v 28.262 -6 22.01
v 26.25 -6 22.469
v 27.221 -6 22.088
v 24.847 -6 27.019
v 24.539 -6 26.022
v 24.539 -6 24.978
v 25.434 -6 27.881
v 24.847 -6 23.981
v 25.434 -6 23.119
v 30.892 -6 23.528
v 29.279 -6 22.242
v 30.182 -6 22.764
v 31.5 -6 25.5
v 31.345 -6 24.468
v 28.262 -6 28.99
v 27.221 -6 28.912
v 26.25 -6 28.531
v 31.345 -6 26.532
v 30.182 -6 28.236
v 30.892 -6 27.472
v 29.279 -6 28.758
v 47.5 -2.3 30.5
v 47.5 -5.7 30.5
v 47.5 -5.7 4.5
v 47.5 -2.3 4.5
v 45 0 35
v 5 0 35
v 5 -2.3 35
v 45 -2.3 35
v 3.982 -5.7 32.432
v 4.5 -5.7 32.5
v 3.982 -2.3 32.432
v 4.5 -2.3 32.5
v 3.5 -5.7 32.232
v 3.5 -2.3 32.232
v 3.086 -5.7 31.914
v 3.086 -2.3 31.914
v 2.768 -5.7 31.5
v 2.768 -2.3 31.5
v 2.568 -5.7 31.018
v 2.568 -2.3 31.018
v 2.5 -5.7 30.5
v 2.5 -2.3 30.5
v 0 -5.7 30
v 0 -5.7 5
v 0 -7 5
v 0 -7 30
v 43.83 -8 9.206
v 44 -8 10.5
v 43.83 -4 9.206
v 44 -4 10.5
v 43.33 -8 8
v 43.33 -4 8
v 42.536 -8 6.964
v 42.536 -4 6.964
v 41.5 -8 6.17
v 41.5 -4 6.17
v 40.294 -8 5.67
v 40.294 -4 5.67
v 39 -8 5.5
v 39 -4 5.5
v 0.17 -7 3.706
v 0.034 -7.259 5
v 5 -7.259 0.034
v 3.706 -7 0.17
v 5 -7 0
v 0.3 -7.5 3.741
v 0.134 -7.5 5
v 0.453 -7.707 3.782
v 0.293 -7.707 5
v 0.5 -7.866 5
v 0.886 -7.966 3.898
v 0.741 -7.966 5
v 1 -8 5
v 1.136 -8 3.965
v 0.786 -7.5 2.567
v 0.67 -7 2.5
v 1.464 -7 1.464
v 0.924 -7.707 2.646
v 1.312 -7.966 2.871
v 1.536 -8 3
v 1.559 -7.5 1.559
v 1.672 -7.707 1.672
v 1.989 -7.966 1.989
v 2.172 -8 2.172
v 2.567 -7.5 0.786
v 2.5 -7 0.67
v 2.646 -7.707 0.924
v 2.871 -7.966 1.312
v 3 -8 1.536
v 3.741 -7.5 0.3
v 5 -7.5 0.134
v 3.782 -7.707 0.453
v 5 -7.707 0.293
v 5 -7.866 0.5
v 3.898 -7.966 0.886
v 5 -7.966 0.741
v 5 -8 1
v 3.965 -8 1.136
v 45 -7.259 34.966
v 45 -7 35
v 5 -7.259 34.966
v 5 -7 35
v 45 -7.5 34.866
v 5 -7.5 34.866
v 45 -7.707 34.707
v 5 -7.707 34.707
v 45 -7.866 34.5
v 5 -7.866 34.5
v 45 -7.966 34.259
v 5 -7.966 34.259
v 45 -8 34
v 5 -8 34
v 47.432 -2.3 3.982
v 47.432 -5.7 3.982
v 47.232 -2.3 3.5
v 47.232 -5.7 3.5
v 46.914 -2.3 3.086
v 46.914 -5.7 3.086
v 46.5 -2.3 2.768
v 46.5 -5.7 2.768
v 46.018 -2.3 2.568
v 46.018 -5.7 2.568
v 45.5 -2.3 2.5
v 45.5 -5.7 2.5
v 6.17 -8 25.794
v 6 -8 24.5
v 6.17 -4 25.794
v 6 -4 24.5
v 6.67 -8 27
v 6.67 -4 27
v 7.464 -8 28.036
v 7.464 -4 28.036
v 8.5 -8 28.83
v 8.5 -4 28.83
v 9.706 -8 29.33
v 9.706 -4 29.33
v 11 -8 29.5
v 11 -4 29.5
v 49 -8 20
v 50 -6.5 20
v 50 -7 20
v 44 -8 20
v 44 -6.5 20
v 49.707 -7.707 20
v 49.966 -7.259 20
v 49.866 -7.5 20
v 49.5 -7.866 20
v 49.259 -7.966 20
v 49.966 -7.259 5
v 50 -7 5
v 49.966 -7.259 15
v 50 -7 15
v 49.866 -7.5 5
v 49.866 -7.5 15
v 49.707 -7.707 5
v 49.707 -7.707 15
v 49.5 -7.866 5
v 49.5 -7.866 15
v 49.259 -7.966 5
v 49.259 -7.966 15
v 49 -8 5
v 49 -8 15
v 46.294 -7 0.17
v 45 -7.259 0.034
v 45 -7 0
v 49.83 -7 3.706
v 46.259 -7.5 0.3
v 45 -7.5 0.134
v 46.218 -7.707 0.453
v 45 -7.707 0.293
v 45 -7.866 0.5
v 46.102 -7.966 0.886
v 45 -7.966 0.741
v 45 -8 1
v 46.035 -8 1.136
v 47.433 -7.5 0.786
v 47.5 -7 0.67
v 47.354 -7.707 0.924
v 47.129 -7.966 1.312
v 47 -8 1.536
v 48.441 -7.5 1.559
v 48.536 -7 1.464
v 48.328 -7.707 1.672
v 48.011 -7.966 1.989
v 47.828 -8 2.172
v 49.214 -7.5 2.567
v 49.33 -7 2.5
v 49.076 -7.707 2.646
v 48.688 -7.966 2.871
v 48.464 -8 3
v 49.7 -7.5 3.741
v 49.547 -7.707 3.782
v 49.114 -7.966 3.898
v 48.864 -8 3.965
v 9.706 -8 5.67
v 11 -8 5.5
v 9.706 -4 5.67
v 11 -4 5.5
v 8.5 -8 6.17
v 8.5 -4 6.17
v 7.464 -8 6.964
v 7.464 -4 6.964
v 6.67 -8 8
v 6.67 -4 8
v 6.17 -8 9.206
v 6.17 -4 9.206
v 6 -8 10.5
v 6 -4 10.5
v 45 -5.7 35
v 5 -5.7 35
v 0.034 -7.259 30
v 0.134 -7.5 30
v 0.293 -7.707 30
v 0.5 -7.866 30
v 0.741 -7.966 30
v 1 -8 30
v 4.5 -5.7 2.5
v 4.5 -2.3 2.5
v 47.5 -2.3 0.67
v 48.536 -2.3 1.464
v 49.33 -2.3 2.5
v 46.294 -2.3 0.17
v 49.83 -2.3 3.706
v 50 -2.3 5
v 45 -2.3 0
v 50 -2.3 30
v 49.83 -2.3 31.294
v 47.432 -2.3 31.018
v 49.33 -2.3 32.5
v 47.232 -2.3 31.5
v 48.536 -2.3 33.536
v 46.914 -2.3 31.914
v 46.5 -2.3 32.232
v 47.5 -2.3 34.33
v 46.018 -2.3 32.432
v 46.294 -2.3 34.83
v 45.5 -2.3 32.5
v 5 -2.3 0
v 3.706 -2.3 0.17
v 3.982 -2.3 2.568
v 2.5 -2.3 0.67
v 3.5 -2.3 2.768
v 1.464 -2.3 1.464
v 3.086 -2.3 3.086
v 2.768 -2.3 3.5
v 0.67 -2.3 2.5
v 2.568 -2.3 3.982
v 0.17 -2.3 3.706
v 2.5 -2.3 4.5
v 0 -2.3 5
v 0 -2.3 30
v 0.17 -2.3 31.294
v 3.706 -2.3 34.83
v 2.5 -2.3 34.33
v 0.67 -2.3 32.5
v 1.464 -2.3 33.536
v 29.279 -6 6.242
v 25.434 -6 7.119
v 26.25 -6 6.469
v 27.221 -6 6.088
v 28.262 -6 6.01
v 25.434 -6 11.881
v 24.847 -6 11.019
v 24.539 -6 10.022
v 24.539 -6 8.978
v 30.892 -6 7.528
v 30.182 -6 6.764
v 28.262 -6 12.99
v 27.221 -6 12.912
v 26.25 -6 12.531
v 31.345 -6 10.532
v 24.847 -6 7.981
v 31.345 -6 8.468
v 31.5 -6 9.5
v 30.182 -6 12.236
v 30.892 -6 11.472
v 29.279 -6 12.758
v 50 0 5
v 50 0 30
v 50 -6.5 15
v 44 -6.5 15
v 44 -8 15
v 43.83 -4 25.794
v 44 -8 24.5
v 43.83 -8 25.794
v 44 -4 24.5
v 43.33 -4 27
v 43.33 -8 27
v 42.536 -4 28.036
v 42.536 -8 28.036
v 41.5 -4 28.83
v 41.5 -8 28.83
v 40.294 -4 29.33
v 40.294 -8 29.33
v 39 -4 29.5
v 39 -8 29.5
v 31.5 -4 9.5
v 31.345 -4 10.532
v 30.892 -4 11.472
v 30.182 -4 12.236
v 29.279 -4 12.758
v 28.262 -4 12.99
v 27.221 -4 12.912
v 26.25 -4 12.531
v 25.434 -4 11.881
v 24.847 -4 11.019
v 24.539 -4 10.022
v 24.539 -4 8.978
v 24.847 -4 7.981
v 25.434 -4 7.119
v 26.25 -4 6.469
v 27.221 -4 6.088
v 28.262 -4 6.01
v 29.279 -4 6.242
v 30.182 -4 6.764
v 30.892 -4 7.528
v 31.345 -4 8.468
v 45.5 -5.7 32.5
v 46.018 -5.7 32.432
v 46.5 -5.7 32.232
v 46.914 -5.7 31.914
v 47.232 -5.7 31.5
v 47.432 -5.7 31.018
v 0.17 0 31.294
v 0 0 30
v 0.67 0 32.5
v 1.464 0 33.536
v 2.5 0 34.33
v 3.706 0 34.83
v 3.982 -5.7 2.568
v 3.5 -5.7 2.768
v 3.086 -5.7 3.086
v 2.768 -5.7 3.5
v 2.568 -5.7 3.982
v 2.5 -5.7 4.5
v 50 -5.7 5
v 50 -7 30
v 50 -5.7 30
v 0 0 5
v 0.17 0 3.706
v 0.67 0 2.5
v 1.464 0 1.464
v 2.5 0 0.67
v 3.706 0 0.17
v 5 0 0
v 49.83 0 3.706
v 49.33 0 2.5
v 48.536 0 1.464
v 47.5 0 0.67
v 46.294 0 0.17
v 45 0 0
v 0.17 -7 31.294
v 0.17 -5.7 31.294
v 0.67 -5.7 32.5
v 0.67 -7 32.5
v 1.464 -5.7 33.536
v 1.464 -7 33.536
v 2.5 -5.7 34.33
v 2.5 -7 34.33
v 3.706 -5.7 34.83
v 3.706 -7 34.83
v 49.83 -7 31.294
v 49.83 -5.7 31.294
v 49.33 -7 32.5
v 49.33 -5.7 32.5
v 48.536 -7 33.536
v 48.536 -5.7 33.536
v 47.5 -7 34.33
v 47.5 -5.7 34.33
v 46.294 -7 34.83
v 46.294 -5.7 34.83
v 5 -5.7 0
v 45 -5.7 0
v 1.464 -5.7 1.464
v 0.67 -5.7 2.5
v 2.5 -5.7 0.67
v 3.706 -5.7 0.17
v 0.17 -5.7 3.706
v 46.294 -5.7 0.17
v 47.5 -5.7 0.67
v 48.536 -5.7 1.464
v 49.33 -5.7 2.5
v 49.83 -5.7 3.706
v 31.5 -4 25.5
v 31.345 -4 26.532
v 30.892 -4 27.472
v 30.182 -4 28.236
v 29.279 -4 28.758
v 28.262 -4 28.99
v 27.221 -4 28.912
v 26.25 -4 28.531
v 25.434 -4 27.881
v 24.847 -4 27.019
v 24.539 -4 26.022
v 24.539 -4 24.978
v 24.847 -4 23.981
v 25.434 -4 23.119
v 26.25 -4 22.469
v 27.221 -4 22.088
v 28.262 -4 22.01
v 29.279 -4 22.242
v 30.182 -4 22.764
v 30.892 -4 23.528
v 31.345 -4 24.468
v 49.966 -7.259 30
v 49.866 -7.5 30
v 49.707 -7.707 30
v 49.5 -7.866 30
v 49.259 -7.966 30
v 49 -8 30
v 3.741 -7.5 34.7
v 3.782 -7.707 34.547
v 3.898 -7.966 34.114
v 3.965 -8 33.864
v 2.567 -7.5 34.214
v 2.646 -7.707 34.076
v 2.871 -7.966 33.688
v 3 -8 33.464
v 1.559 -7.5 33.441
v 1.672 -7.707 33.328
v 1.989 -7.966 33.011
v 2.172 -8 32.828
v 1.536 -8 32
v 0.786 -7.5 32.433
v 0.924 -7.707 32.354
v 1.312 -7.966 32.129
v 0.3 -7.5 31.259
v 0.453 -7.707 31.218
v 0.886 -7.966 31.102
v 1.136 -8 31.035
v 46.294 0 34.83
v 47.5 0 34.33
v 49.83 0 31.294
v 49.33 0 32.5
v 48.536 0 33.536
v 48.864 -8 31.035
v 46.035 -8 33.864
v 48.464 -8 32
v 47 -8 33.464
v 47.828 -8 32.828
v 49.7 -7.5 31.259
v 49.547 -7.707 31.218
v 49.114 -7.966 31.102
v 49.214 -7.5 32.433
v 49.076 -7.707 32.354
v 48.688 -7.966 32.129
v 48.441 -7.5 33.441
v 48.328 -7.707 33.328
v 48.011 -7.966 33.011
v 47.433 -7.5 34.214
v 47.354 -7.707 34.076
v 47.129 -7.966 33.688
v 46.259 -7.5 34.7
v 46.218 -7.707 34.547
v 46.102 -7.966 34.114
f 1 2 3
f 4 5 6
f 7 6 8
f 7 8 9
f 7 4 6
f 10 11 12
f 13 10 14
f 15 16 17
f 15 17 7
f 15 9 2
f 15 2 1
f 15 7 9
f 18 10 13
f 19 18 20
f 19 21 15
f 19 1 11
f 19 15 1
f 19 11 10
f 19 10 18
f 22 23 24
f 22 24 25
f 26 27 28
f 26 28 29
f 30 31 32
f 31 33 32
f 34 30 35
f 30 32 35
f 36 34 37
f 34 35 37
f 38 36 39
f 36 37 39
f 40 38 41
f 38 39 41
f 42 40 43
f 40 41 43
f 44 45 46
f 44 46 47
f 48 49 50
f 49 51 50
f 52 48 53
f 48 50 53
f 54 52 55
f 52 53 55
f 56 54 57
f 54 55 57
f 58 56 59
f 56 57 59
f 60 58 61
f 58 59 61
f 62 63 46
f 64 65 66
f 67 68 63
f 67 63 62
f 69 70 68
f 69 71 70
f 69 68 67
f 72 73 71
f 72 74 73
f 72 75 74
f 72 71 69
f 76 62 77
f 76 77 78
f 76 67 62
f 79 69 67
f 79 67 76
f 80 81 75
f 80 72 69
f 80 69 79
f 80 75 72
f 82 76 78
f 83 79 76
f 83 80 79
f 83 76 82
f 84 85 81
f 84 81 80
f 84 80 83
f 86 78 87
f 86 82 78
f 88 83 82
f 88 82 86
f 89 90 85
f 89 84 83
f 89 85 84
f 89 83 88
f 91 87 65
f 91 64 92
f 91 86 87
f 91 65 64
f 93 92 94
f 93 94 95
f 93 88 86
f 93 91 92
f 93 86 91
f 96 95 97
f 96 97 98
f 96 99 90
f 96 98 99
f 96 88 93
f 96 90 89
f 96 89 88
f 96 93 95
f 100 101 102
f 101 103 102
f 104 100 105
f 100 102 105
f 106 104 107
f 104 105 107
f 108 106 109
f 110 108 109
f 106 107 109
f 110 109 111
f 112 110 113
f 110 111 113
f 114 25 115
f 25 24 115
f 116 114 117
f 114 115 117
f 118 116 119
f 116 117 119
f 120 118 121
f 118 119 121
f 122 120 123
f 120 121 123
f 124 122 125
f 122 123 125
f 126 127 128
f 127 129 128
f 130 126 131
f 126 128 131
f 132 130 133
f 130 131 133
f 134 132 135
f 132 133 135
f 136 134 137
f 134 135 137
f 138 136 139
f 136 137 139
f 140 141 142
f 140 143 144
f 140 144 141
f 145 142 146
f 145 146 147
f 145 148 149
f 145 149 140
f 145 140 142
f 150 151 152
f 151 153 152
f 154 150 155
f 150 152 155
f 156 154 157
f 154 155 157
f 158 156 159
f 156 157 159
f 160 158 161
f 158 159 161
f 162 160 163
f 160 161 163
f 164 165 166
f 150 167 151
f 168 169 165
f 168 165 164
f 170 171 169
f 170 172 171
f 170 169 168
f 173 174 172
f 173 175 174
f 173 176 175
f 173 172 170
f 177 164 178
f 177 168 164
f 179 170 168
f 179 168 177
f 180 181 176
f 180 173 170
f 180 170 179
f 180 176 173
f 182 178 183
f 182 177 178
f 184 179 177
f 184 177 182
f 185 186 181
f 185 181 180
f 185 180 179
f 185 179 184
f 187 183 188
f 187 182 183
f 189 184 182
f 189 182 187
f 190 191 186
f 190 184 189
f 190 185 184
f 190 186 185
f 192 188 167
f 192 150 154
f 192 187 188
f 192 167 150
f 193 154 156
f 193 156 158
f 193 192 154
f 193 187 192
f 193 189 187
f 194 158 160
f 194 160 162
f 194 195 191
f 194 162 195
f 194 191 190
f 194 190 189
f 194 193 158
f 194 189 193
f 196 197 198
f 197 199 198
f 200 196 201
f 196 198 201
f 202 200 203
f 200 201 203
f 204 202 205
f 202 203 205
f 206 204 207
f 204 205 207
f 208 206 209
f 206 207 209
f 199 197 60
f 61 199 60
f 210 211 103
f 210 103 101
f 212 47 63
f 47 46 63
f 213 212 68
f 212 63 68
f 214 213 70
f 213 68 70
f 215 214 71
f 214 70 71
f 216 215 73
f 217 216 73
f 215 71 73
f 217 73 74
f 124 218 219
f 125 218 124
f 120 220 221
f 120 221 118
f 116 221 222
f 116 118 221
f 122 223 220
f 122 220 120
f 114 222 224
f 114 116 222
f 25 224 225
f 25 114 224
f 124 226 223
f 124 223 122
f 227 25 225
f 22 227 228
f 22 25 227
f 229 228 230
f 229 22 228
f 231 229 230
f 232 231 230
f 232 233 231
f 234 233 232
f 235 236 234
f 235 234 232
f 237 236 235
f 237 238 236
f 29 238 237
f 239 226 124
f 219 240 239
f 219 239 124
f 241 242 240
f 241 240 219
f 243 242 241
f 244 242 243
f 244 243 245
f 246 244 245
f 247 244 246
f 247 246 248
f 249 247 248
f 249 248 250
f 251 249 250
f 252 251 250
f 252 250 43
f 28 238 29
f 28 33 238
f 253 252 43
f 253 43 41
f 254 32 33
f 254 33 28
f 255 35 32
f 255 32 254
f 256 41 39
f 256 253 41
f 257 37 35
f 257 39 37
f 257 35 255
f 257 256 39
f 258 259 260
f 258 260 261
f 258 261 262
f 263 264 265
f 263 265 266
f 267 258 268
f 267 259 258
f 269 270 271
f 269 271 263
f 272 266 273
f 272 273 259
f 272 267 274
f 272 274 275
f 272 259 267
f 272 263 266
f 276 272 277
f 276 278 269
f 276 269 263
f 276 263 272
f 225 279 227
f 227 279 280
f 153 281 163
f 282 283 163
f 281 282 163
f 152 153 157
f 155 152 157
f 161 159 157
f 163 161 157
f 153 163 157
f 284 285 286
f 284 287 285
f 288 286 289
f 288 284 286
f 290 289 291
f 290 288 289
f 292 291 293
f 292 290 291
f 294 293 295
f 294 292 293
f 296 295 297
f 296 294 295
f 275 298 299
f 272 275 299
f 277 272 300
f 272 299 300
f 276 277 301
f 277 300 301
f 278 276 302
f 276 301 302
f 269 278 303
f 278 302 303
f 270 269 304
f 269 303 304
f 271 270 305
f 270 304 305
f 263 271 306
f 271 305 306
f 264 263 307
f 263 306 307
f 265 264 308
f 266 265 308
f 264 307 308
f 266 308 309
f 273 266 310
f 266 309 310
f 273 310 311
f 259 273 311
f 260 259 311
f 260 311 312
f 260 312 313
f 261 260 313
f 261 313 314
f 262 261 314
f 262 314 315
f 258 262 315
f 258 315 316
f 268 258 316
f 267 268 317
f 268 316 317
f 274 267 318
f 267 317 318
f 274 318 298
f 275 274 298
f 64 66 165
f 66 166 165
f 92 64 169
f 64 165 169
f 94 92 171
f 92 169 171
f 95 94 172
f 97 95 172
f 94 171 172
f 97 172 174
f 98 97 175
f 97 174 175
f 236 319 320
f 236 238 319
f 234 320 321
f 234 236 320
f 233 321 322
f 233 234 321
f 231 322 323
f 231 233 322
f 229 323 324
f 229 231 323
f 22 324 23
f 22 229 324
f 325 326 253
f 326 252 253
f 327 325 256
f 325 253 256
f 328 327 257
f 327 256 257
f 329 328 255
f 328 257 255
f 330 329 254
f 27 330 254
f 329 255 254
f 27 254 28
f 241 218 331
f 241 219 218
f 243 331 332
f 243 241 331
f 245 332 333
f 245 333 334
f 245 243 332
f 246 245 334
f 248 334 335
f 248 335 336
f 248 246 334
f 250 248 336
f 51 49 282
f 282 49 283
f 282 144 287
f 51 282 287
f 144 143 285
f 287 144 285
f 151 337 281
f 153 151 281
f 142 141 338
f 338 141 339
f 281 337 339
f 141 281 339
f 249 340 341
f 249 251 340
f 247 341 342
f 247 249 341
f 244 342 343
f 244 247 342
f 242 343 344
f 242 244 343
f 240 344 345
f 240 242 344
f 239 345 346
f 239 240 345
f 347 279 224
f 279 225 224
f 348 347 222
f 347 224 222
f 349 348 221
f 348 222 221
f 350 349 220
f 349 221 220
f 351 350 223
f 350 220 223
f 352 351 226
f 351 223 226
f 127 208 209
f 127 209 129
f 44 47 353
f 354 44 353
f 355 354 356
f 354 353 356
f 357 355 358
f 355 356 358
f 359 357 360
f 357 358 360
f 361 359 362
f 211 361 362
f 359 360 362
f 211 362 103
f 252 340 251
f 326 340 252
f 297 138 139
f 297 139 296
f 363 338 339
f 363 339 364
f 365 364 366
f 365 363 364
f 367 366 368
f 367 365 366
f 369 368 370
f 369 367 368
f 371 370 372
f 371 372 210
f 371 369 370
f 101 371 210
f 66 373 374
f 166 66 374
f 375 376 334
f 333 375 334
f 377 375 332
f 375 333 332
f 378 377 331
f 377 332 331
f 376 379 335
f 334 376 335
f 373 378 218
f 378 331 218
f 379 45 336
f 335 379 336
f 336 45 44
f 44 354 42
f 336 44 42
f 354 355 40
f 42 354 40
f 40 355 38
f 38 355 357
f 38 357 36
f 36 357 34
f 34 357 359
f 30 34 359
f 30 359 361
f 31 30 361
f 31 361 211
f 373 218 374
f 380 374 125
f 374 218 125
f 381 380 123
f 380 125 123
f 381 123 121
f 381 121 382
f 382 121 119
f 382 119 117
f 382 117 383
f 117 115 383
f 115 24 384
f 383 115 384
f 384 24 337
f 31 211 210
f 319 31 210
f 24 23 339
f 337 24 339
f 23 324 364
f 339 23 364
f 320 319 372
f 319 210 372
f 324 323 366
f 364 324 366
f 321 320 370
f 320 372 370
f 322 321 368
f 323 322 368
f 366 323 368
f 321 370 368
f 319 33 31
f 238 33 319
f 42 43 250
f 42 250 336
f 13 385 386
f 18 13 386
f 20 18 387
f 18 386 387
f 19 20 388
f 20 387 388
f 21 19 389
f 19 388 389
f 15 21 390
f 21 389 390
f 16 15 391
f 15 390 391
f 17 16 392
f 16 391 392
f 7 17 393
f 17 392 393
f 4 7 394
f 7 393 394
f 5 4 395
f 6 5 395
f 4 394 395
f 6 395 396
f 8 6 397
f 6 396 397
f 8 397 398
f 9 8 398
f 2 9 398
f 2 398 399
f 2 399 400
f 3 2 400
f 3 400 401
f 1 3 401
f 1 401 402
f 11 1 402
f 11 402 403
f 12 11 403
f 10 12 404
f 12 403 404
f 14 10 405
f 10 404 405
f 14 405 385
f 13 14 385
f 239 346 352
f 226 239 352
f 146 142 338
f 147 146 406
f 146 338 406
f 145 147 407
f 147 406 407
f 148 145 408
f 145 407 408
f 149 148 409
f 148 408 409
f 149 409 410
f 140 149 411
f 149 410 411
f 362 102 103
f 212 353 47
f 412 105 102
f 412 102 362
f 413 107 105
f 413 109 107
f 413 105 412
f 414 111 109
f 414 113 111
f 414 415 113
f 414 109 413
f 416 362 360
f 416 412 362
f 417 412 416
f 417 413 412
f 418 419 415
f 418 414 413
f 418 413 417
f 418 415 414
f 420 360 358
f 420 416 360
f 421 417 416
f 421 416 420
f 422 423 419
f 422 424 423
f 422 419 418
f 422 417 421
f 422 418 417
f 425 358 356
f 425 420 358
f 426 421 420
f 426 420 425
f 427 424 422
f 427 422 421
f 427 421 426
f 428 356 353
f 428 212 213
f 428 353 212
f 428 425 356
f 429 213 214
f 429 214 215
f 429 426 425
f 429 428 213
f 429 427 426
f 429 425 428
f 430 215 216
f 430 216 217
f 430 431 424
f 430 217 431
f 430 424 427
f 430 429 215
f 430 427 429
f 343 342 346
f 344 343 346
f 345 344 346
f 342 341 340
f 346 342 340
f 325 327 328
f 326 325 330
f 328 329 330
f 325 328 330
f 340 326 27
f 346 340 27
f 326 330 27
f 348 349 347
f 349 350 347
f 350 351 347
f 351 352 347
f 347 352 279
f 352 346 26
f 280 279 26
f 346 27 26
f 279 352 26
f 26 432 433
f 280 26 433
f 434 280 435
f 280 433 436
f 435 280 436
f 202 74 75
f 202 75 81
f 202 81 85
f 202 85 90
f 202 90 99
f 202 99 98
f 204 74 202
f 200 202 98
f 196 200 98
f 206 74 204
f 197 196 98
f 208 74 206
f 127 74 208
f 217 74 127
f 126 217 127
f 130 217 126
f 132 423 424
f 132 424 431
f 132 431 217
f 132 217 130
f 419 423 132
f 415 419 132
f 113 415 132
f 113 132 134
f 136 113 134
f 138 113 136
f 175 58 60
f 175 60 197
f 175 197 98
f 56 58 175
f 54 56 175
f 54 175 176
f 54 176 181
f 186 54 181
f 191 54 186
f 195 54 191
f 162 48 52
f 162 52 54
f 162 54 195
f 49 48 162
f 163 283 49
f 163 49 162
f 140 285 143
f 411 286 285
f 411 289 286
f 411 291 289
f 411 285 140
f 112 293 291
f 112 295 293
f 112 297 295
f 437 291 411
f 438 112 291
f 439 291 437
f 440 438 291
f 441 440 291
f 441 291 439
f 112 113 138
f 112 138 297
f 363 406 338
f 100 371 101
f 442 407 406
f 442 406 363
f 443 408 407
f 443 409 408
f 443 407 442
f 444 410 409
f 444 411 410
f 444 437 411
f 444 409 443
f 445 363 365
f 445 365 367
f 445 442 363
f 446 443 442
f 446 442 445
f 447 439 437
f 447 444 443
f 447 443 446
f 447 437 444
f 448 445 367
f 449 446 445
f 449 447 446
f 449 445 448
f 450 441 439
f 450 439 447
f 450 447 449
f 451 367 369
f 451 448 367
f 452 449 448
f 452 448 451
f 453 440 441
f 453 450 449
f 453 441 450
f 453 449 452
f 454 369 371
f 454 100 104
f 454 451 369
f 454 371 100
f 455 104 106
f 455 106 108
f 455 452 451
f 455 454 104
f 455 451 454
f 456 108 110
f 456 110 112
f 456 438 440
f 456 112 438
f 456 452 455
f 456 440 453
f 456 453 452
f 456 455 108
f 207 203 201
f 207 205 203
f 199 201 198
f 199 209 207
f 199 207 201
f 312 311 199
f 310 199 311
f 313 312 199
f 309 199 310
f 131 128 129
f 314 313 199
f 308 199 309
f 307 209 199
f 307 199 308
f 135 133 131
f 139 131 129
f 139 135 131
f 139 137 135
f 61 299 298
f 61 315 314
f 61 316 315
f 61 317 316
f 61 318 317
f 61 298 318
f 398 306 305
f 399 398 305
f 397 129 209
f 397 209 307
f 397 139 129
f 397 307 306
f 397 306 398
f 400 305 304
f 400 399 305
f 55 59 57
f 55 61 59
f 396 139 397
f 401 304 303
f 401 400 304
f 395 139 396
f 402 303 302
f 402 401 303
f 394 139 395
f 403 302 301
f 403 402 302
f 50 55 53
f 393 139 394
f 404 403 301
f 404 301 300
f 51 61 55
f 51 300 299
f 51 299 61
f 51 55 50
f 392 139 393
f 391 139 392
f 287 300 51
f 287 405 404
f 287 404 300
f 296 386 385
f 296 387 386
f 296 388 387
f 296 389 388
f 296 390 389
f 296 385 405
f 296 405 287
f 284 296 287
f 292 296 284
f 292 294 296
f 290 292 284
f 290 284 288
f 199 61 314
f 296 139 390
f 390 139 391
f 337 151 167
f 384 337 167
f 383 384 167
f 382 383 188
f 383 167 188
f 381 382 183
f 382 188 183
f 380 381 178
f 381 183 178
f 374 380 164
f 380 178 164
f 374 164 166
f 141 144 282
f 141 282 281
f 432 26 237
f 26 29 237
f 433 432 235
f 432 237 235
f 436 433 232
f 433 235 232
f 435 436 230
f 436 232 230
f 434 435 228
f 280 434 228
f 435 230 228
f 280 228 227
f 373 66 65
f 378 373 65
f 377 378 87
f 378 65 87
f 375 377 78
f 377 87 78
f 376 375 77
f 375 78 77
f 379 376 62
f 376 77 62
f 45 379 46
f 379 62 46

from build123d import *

# Parameters (mm, degrees)
F0_W      = 50
F0_H      = 35
F1_DEPTH  = 8
F2_W      = 38
F2_H      = 24
F3_DEPTH  = 4
F4_R      = 3.5
F6_DEPTH  = 2
F5_R      = 3.5
F7_DEPTH  = 2
F8_W      = 6
F8_H      = 5
F9_DEPTH  = 1.5
F10_W     = 50
F10_H     = 3.4
F14_DEPTH = 2.5
F11_W     = 3.4
F11_H     = 35
F15_DEPTH = 2.5
F12_W     = 50
F12_H     = 3.4
F16_DEPTH = 2.5
F13_W     = 3.4
F13_H     = 35
F17_DEPTH = 2.5
F18_R     = 5
F19_R     = 1
F20_R     = 2


with BuildPart() as f1:
    # F0 (on Front) → F1 (new body)
    with BuildSketch(Plane.XZ):
        with Locations((25, 17.5)):
            Rectangle(F0_W, F0_H)
    extrude(amount=F1_DEPTH)

    # F2 (on face) → F3 (cut)
    with BuildSketch(Plane.XZ.offset(8)):
        with Locations((25, 17.5)):
            Rectangle(F2_W, F2_H)
    extrude(amount=-F3_DEPTH, mode=Mode.SUBTRACT)

    # F4 (on face) → F6 (join)
    with BuildSketch(Plane.XZ.offset(4)):
        with Locations((28, 9.5)):
            Circle(F4_R)
    extrude(amount=F6_DEPTH)

    # F5 (on face) → F7 (join)
    with BuildSketch(Plane.XZ.offset(4)):
        with Locations((28, 25.5)):
            Circle(F5_R)
    extrude(amount=F7_DEPTH)

    # F8 (on face) → F9 (cut)
    with BuildSketch(Plane.XZ.offset(8)):
        with Locations((47, 17.5)):
            Rectangle(F8_W, F8_H)
    extrude(amount=-F9_DEPTH, mode=Mode.SUBTRACT)

    # F10 (on face) → F14 (cut)
    with BuildSketch(Plane(origin=(0, 0, 0), x_dir=(1, 0, 0), z_dir=(0, 0, -1))):
        with Locations((25, 4)):
            Rectangle(F10_W, F10_H)
    extrude(amount=-F14_DEPTH, mode=Mode.SUBTRACT)

    # F11 (on face) → F15 (cut)
    with BuildSketch(Plane(origin=(0, 0, 0), x_dir=(0, -1, 0), z_dir=(-1, 0, 0))):
        with Locations((4, 17.5)):
            Rectangle(F11_W, F11_H)
    extrude(amount=-F15_DEPTH, mode=Mode.SUBTRACT)

    # F12 (on face) → F16 (cut)
    with BuildSketch(Plane.XY.offset(35)):
        with Locations((25, -4)):
            Rectangle(F12_W, F12_H)
    extrude(amount=-F16_DEPTH, mode=Mode.SUBTRACT)

    # F13 (on face) → F17 (cut)
    with BuildSketch(Plane.YZ.offset(50)):
        with Locations((-4, 17.5)):
            Rectangle(F13_W, F13_H)
    extrude(amount=-F17_DEPTH, mode=Mode.SUBTRACT)

    # F18
    f18_edges = [f1.edges().sort_by_distance(p)[0] for p in [
        (0, -1.15, 35),
        (0, -6.85, 35),
        (0, -1.15, 0),
        (0, -6.85, 0),
        (50, -1.15, 0),
        (50, -6.85, 0),
        (50, -1.15, 35),
        (50, -6.85, 35),
        (44, -6, 29.5),
        (44, -6, 5.5),
        (6, -6, 5.5),
        (6, -6, 29.5),
    ]]
    fillet(f18_edges, radius=F18_R)

    # F19
    f19_edges = [f1.edges().sort_by_distance(p)[0] for p in [
        (25, -8, 0),
    ]]
    fillet(f19_edges, radius=F19_R)

    # F20
    f20_edges = [f1.edges().sort_by_distance(p)[0] for p in [
        (2.5, -4, 32.5),
        (2.5, -4, 2.5),
        (47.5, -4, 2.5),
        (47.5, -4, 32.5),
    ]]
    fillet(f20_edges, radius=F20_R)


solid = f1.part
